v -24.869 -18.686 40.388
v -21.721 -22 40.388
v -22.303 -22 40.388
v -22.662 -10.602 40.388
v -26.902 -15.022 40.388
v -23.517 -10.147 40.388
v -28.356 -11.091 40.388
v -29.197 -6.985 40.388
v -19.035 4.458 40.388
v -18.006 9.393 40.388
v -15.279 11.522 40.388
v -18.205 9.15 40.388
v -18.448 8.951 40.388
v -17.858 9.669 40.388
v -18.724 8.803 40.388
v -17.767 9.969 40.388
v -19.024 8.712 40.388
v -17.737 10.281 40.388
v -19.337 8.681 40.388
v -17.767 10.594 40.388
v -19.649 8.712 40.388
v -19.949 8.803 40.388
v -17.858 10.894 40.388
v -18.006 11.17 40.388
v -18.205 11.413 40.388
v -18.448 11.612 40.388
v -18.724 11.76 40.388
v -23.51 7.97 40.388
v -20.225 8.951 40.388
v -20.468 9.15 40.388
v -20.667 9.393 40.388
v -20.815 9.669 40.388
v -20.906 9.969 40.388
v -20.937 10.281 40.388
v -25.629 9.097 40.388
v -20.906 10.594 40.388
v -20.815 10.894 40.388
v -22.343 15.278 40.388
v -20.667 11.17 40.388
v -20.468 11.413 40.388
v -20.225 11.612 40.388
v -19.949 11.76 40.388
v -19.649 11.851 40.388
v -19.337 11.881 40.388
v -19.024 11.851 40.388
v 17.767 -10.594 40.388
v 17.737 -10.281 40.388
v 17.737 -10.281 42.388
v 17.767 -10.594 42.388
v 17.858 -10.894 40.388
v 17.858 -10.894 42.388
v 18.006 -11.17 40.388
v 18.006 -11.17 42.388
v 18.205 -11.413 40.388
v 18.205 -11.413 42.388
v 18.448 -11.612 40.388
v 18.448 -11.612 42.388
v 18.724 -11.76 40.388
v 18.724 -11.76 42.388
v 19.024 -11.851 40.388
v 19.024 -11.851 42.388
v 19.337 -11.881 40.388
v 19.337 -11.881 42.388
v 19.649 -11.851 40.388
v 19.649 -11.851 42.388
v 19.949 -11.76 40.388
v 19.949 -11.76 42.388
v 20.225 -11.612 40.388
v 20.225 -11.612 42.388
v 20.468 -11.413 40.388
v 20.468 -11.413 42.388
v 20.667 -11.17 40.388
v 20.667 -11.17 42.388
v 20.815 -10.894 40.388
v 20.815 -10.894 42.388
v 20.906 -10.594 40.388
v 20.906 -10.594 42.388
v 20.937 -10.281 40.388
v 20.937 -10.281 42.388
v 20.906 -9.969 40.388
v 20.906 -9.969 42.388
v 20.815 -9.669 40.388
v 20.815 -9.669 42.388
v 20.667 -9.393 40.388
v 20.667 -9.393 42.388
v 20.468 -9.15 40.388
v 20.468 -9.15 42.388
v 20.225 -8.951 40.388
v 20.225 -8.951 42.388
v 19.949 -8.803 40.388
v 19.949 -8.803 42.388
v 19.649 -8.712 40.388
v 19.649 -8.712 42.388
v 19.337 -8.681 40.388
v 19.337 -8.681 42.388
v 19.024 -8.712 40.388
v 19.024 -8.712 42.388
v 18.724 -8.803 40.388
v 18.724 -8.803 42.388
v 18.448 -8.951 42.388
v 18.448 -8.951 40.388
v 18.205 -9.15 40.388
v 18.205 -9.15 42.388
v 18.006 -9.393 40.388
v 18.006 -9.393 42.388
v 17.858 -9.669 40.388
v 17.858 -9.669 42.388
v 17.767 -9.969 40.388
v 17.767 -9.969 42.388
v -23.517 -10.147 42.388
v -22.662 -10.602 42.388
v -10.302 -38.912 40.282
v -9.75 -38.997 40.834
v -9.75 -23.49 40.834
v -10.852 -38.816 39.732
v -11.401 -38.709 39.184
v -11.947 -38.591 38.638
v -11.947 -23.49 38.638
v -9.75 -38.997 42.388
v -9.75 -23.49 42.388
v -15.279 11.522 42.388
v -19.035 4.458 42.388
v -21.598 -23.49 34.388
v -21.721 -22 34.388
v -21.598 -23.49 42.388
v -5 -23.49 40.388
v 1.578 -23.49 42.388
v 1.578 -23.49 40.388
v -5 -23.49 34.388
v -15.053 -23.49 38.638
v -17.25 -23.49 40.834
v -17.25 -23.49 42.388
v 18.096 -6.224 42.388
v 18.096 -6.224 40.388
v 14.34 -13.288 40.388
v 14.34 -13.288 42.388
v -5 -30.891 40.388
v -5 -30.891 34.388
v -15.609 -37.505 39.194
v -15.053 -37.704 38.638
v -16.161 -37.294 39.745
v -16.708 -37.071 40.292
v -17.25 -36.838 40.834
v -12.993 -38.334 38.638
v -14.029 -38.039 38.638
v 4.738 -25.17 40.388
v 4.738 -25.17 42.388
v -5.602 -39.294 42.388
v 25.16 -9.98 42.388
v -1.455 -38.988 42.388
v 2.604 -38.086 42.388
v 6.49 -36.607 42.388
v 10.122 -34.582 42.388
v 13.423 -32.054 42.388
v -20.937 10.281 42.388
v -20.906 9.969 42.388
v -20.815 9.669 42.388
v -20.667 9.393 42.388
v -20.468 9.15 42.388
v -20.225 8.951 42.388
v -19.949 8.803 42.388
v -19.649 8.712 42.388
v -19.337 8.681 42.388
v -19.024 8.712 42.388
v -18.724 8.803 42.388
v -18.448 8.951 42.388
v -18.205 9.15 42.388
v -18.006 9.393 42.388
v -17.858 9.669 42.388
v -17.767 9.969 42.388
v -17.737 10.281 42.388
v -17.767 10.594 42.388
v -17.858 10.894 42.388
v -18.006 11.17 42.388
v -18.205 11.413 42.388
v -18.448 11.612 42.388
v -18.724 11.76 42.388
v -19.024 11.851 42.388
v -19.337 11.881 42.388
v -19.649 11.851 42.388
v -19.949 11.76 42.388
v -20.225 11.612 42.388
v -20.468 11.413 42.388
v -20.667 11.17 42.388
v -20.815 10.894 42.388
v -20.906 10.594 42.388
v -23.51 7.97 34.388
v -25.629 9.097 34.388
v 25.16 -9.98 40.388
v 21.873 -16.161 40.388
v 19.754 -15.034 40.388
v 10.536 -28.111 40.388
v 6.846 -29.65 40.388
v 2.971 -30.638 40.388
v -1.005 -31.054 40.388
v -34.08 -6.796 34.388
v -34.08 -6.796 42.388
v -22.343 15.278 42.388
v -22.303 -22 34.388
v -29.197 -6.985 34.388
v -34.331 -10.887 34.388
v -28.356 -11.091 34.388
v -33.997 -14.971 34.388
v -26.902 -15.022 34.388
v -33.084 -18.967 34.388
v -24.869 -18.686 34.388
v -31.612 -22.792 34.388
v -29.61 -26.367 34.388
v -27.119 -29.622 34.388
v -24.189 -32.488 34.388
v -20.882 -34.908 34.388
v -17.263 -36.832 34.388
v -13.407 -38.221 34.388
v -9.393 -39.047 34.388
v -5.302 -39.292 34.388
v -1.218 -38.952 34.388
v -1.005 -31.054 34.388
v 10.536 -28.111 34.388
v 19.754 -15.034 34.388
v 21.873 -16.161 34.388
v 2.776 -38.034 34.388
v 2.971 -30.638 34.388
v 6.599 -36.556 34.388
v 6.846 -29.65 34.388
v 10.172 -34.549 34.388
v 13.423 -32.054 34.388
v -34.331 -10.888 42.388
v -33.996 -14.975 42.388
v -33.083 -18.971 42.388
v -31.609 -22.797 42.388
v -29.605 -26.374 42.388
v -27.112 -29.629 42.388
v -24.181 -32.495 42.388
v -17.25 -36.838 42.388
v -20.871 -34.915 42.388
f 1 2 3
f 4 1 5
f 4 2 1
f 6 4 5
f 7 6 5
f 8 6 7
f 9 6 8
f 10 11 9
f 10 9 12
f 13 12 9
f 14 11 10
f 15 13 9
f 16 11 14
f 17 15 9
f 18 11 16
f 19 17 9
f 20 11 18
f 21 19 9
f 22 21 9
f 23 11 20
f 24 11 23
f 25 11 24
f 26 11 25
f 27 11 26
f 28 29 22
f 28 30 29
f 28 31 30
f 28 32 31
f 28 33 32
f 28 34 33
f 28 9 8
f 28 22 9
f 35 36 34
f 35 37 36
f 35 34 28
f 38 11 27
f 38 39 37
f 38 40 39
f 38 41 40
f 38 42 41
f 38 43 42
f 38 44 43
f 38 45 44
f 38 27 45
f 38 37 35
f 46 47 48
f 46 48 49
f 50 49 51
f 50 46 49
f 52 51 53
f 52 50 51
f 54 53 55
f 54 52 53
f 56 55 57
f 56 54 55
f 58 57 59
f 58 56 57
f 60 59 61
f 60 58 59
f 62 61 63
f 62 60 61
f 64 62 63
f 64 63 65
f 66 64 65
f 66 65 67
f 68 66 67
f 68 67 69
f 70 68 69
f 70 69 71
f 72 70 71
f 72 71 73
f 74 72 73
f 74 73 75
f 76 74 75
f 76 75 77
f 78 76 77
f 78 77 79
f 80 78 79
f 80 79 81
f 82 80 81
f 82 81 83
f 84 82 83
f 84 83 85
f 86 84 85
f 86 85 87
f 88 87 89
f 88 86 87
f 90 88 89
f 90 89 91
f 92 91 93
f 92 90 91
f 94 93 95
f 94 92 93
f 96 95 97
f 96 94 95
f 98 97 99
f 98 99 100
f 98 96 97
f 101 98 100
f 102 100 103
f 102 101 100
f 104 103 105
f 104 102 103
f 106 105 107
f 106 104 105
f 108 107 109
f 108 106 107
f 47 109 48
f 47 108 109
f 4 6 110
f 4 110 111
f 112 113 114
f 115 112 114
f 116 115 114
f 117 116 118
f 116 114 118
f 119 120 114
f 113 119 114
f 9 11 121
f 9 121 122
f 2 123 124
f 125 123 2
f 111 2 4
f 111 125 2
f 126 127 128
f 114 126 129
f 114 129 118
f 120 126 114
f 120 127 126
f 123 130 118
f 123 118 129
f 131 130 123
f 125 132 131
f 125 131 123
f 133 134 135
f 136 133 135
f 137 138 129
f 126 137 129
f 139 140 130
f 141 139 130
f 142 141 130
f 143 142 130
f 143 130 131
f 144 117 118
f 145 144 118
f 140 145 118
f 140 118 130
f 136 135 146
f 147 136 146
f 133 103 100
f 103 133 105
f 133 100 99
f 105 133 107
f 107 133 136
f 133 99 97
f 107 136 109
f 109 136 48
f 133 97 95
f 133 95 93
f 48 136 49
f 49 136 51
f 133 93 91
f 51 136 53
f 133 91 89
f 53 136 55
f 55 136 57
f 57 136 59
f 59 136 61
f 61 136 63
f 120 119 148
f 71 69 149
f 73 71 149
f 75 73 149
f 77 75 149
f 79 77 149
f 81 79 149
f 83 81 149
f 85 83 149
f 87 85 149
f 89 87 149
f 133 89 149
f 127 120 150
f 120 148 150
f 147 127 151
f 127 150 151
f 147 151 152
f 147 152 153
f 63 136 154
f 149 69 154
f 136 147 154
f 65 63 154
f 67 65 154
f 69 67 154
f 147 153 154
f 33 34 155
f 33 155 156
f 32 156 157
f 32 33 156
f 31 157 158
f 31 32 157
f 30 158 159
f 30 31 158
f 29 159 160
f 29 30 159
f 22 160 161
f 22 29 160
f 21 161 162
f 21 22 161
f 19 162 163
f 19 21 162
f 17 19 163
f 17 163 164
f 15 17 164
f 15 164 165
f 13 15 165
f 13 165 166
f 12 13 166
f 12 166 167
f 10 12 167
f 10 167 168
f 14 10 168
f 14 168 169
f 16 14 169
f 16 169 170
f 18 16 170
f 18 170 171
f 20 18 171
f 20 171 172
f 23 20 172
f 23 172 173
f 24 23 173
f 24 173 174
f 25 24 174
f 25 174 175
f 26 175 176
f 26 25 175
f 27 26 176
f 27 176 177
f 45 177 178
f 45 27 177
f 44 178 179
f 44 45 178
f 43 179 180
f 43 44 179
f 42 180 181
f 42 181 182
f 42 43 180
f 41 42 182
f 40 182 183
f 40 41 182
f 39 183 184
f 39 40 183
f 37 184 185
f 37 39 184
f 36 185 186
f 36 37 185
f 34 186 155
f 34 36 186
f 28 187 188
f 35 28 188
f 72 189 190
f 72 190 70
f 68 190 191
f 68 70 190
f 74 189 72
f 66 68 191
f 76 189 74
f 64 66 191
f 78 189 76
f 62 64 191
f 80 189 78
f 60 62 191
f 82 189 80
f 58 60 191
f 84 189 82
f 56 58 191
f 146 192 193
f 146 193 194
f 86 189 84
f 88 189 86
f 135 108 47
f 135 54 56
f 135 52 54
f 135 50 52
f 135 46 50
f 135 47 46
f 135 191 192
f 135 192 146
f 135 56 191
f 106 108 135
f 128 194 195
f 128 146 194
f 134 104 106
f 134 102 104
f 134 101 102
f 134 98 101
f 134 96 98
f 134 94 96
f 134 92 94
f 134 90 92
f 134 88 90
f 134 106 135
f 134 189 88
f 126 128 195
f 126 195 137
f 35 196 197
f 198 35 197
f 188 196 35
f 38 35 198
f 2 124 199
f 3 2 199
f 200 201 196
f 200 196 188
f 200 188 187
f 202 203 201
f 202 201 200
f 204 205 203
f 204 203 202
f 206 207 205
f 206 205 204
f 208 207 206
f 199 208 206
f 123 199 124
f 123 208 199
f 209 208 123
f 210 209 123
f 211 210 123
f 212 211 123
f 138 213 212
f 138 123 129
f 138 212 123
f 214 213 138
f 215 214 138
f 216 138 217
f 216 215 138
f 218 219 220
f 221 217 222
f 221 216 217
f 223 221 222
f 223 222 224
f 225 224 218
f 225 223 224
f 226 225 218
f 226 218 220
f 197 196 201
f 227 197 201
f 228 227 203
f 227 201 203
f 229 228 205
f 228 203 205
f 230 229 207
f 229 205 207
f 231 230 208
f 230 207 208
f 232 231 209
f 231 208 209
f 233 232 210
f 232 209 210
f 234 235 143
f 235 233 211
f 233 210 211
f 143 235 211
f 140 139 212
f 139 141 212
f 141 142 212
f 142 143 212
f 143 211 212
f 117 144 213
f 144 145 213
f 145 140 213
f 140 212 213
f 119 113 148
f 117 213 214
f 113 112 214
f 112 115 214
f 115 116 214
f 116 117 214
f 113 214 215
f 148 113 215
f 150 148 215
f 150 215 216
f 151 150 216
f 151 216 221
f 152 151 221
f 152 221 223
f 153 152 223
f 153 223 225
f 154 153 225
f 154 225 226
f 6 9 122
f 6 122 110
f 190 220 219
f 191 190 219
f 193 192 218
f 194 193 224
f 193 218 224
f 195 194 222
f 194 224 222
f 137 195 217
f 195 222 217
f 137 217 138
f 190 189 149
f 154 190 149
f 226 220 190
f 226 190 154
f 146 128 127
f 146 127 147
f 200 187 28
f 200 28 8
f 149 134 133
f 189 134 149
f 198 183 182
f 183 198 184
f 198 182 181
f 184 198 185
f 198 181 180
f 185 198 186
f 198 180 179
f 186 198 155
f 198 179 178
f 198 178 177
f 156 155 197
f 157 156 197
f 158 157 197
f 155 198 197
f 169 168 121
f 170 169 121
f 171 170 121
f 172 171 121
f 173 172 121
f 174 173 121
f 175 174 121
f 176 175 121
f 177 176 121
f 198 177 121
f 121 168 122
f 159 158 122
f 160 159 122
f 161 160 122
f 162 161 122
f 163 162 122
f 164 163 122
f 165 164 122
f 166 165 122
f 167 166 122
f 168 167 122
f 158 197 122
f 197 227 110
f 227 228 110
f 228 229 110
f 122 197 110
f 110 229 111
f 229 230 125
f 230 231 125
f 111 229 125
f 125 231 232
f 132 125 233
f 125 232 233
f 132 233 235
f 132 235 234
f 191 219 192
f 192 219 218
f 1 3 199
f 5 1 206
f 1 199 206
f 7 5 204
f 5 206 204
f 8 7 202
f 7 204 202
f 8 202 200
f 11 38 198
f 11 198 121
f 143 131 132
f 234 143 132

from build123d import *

# Parameters (mm, degrees)
SKETCH_R             = 1.6
PAD_DEPTH            = 8
POCKET_DEPTH         = 6
SKETCH001_W          = 18
SKETCH001_H          = 10
PAD001_DEPTH         = 8
POCKET001_DEPTH      = 34
POCKET001_DEPTH_BACK = 12
POCKET002_DEPTH      = 8.001


with BuildPart() as part:
    # Sketch → Pad (new body)
    with BuildSketch(Plane(origin=(0, 0, 34.387781), x_dir=(-1, 0, 0), z_dir=(0, 0, 1))):
        with BuildLine():
            Line((-25.159705, 9.979942), (-13.422916, 32.053632))
            ThreePointArc((34.079665, 6.796062), (19.106838, 35.934736), (-13.422916, 32.053632))
            Line((34.079665, 6.796062), (22.342876, -15.277628))
            Line((22.342876, -15.277628), (15.279295, -11.521855))
            Line((15.279295, -11.521855), (19.035067, -4.458275))
            Line((19.035067, -4.458275), (23.516593, 10.147407))
            Line((23.516593, 10.147407), (-4.73773, 25.170497))
            Line((-14.340352, 13.287751), (-4.73773, 25.170497))
            Line((-18.096124, 6.22417), (-14.340352, 13.287751))
            Line((-18.096124, 6.22417), (-25.159705, 9.979942))
        make_face()
        with Locations((-19.336552, 10.281427)):
            Circle(SKETCH_R, mode=Mode.SUBTRACT)
        with Locations((19.336552, -10.281427)):
            Circle(SKETCH_R, mode=Mode.SUBTRACT)
    extrude(amount=PAD_DEPTH)

    # Sketch004 → Pocket (cut)
    with BuildSketch(Plane(origin=(0, 0, 34.387781), x_dir=(-1, 0, 0), z_dir=(0, 0, -1))):
        with BuildLine():
            ThreePointArc((-10.535805, -28.111259), (14.805415, -27.844935), (29.196837, -6.985039))
            Line((23.510102, 7.970263), (29.196837, -6.985039))
            Line((23.510102, 7.970263), (33.765539, 13.423175))
            Line((33.765539, 13.423175), (24.376107, 31.082127))
            Line((24.376107, 31.082127), (-39.399197, -2.827804))
            Line((-39.399197, -2.827804), (-30.009766, -20.486756))
            Line((-30.009766, -20.486756), (-19.75433, -15.033844))
            Line((-19.75433, -15.033844), (-10.535805, -28.111259))
        make_face()
    extrude(amount=-POCKET_DEPTH, mode=Mode.SUBTRACT)

    # Sketch001 (on Face13 of Pad) → Pad001 (join)
    with BuildSketch(Plane(origin=(0, 0, 34.387781), x_dir=(-1, 0, 0), z_dir=(0, 0, -1))):
        with Locations((14, -27)):
            Rectangle(SKETCH001_W, SKETCH001_H)
    extrude(amount=-PAD001_DEPTH)

    # Sketch006 (on Face16 of Pad001) → Pocket001 (cut, two sides)
    with BuildSketch(Plane(origin=(0, -22, 34.387781), x_dir=(-1, 0, 0), z_dir=(0, 1, 0))) as pocket001_sk:
        Polygon((11.946699, 4.25), (15.053301, 4.25), (17.25, 6.446699), (17.25, 9.446699), (9.75, 9.446699), (9.75, 6.446699), align=None)
    extrude(amount=-POCKET001_DEPTH, mode=Mode.SUBTRACT)
    extrude(pocket001_sk.sketch, amount=POCKET001_DEPTH_BACK, mode=Mode.SUBTRACT)

    # Sketch007 (on Face29 of Pocket001) → Pocket002 (cut, through all)
    with BuildSketch(Plane(origin=(0, 0, 42.387781), x_dir=(-1, 0, 0), z_dir=(0, 0, 1))):
        Polygon((-3.522127, 23.490412), (21.597948, 23.490412), (22.751427, 9.520575), align=None)
    extrude(amount=-POCKET002_DEPTH, mode=Mode.SUBTRACT)


solid = part.part
